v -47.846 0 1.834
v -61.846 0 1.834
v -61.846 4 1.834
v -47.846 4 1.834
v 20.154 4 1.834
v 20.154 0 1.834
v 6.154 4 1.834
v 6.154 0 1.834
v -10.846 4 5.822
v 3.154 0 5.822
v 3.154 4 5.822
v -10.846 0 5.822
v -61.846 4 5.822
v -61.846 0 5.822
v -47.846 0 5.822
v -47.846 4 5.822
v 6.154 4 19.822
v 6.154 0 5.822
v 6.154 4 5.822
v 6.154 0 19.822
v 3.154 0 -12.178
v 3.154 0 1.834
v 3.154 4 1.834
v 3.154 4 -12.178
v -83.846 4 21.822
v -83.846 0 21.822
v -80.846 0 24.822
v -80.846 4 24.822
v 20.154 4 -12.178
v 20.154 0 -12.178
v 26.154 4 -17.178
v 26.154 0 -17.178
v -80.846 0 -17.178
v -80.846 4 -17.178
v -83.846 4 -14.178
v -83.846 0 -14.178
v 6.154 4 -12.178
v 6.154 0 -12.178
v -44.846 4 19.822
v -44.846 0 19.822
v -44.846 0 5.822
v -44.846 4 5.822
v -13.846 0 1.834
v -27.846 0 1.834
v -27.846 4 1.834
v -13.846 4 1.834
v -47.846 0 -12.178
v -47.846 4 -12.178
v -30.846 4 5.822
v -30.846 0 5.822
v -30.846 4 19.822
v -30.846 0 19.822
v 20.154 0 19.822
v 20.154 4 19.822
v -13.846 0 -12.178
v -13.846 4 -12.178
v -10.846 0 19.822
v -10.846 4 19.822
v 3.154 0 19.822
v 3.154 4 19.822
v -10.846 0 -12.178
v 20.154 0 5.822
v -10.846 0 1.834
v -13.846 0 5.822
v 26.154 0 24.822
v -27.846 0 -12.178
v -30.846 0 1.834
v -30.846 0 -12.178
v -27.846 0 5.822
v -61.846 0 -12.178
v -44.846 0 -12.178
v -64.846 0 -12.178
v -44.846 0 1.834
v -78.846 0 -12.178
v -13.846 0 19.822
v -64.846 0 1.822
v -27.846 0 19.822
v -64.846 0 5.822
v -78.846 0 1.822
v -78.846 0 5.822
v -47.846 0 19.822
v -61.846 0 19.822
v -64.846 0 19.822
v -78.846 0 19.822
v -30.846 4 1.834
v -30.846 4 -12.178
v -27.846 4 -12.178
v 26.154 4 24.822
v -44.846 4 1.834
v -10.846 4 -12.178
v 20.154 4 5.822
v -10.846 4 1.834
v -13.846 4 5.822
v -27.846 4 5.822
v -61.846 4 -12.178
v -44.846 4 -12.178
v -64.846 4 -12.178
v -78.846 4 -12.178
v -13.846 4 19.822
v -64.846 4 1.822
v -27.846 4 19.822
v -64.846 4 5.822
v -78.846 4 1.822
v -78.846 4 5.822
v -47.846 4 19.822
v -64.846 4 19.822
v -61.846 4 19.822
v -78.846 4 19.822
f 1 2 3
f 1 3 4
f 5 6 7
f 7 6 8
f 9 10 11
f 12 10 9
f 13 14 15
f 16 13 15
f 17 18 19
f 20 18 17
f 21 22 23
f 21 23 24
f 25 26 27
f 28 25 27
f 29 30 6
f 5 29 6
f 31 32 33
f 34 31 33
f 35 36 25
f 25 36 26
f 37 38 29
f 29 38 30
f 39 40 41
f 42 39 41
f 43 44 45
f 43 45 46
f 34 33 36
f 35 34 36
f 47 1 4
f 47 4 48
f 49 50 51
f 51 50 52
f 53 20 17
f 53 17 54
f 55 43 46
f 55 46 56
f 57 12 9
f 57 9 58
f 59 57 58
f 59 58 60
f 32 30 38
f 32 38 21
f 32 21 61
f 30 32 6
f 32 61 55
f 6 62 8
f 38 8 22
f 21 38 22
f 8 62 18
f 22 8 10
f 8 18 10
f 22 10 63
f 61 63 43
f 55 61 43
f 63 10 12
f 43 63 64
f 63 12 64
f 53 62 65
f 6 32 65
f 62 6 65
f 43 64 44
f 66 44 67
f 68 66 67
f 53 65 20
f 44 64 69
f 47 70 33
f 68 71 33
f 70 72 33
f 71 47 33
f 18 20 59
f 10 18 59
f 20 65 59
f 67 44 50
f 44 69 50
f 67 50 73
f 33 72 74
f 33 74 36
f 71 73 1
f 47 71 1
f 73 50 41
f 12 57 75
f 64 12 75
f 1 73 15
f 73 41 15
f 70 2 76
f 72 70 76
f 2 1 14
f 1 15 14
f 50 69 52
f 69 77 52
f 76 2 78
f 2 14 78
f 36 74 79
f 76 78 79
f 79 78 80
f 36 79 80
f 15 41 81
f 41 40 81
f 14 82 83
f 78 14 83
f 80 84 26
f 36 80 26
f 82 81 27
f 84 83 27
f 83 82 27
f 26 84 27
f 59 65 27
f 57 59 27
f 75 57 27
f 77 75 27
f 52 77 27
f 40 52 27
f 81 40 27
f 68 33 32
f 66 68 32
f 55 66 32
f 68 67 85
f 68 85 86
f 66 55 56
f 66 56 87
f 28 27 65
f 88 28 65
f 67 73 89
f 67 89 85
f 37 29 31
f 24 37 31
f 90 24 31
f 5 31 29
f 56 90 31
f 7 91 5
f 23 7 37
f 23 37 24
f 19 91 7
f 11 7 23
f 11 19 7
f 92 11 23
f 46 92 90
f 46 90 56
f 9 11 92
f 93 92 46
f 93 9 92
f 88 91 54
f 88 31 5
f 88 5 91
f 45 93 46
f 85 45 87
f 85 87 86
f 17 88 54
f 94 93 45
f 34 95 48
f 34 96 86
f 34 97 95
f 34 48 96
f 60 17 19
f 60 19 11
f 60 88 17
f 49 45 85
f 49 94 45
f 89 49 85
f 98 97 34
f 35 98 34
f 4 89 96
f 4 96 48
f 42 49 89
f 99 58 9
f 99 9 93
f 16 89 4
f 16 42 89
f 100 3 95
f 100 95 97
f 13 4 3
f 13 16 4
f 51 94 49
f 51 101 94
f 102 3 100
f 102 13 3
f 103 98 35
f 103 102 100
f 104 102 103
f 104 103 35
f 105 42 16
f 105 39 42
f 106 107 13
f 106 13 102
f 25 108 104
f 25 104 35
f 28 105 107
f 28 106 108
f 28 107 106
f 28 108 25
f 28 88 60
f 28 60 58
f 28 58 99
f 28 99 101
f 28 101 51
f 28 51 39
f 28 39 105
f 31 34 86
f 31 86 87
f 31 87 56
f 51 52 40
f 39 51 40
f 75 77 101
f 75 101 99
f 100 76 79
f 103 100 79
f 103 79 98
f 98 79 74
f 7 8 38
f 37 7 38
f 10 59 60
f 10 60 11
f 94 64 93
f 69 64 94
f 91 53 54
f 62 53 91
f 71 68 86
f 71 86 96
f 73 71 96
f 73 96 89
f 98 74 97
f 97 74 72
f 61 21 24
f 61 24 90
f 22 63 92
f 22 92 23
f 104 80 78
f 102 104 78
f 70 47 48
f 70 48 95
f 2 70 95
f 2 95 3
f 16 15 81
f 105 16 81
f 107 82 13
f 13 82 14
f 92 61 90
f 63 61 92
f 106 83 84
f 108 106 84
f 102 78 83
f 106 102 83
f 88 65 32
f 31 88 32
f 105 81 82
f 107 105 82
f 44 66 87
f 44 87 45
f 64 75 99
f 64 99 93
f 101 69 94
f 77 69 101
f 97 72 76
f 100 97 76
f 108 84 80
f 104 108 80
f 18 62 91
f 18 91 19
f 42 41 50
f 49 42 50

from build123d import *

# Parameters (mm, degrees)
EXTRUDE_1_DEPTH = 4


with BuildPart() as part:
    # Sketch 1 → Бобышка-Вытянуть1 (new body)
    with BuildSketch(Plane(origin=(-80.845718526, 0, 24.821686241), x_dir=(0.9308571955160213, 0, -0.36538319823994075), z_dir=(0, -1, 0))):
        Polygon((0, 0), (99.60171992, 39.096002212), (114.947814246, 0), (15.346094326, -39.096002212), (11.457373145, -37.39958022), (-1.696421992, -3.888721181), align=None)
        Polygon((15.380892726, -33.710949838), (28.412893463, -28.595585062), (23.297528688, -15.563584325), (10.265527951, -20.6789491), align=None, mode=Mode.SUBTRACT)
        Polygon((8.803995158, -16.955520318), (21.835995895, -11.840155543), (16.720631119, 1.191845194), (3.688630382, -3.923519581), align=None, mode=Mode.SUBTRACT)
        Polygon((19.513202706, 2.287994789), (24.628567481, -10.744005948), (37.660568219, -5.628641173), (32.545203443, 7.403359564), align=None, mode=Mode.SUBTRACT)
        Polygon((35.33777503, 8.499509159), (40.453139805, -4.532491578), (53.485140542, 0.582873197), (48.369775767, 13.614873934), align=None, mode=Mode.SUBTRACT)
        Polygon((51.162347354, 14.711023529), (64.194348091, 19.826388304), (69.309712866, 6.794387567), (56.277712129, 1.679022792), align=None, mode=Mode.SUBTRACT)
        Polygon((95.843492738, 32.249417045), (100.958857514, 19.217416307), (87.926856776, 14.102051532), (82.811492001, 27.134052269), align=None, mode=Mode.SUBTRACT)
        Polygon((66.986919677, 20.922537899), (80.018920415, 26.037902675), (85.13428519, 13.005901937), (72.102284453, 7.890537162), align=None, mode=Mode.SUBTRACT)
        Polygon((73.559385355, 4.17839915), (86.591386092, 9.293763925), (91.711182758, -3.749527582), (78.679182021, -8.864892357), align=None, mode=Mode.SUBTRACT)
        Polygon((89.383957678, 10.38991352), (94.503754345, -2.653377987), (107.535755082, 2.461986788), (102.415958416, 15.505278295), align=None, mode=Mode.SUBTRACT)
        Polygon((70.766813768, 3.082249555), (75.886610434, -9.961041952), (62.854609697, -15.076406727), (57.734813031, -2.03311522), align=None, mode=Mode.SUBTRACT)
        Polygon((54.942241444, -3.129264815), (60.062038111, -16.172556322), (47.030037373, -21.287921097), (41.910240707, -8.24462959), align=None, mode=Mode.SUBTRACT)
        Polygon((39.117669121, -9.340779185), (44.237465787, -22.384070692), (31.20546505, -27.499435468), (26.085668383, -14.456143961), align=None, mode=Mode.SUBTRACT)
    extrude(amount=-EXTRUDE_1_DEPTH)


solid = part.part
